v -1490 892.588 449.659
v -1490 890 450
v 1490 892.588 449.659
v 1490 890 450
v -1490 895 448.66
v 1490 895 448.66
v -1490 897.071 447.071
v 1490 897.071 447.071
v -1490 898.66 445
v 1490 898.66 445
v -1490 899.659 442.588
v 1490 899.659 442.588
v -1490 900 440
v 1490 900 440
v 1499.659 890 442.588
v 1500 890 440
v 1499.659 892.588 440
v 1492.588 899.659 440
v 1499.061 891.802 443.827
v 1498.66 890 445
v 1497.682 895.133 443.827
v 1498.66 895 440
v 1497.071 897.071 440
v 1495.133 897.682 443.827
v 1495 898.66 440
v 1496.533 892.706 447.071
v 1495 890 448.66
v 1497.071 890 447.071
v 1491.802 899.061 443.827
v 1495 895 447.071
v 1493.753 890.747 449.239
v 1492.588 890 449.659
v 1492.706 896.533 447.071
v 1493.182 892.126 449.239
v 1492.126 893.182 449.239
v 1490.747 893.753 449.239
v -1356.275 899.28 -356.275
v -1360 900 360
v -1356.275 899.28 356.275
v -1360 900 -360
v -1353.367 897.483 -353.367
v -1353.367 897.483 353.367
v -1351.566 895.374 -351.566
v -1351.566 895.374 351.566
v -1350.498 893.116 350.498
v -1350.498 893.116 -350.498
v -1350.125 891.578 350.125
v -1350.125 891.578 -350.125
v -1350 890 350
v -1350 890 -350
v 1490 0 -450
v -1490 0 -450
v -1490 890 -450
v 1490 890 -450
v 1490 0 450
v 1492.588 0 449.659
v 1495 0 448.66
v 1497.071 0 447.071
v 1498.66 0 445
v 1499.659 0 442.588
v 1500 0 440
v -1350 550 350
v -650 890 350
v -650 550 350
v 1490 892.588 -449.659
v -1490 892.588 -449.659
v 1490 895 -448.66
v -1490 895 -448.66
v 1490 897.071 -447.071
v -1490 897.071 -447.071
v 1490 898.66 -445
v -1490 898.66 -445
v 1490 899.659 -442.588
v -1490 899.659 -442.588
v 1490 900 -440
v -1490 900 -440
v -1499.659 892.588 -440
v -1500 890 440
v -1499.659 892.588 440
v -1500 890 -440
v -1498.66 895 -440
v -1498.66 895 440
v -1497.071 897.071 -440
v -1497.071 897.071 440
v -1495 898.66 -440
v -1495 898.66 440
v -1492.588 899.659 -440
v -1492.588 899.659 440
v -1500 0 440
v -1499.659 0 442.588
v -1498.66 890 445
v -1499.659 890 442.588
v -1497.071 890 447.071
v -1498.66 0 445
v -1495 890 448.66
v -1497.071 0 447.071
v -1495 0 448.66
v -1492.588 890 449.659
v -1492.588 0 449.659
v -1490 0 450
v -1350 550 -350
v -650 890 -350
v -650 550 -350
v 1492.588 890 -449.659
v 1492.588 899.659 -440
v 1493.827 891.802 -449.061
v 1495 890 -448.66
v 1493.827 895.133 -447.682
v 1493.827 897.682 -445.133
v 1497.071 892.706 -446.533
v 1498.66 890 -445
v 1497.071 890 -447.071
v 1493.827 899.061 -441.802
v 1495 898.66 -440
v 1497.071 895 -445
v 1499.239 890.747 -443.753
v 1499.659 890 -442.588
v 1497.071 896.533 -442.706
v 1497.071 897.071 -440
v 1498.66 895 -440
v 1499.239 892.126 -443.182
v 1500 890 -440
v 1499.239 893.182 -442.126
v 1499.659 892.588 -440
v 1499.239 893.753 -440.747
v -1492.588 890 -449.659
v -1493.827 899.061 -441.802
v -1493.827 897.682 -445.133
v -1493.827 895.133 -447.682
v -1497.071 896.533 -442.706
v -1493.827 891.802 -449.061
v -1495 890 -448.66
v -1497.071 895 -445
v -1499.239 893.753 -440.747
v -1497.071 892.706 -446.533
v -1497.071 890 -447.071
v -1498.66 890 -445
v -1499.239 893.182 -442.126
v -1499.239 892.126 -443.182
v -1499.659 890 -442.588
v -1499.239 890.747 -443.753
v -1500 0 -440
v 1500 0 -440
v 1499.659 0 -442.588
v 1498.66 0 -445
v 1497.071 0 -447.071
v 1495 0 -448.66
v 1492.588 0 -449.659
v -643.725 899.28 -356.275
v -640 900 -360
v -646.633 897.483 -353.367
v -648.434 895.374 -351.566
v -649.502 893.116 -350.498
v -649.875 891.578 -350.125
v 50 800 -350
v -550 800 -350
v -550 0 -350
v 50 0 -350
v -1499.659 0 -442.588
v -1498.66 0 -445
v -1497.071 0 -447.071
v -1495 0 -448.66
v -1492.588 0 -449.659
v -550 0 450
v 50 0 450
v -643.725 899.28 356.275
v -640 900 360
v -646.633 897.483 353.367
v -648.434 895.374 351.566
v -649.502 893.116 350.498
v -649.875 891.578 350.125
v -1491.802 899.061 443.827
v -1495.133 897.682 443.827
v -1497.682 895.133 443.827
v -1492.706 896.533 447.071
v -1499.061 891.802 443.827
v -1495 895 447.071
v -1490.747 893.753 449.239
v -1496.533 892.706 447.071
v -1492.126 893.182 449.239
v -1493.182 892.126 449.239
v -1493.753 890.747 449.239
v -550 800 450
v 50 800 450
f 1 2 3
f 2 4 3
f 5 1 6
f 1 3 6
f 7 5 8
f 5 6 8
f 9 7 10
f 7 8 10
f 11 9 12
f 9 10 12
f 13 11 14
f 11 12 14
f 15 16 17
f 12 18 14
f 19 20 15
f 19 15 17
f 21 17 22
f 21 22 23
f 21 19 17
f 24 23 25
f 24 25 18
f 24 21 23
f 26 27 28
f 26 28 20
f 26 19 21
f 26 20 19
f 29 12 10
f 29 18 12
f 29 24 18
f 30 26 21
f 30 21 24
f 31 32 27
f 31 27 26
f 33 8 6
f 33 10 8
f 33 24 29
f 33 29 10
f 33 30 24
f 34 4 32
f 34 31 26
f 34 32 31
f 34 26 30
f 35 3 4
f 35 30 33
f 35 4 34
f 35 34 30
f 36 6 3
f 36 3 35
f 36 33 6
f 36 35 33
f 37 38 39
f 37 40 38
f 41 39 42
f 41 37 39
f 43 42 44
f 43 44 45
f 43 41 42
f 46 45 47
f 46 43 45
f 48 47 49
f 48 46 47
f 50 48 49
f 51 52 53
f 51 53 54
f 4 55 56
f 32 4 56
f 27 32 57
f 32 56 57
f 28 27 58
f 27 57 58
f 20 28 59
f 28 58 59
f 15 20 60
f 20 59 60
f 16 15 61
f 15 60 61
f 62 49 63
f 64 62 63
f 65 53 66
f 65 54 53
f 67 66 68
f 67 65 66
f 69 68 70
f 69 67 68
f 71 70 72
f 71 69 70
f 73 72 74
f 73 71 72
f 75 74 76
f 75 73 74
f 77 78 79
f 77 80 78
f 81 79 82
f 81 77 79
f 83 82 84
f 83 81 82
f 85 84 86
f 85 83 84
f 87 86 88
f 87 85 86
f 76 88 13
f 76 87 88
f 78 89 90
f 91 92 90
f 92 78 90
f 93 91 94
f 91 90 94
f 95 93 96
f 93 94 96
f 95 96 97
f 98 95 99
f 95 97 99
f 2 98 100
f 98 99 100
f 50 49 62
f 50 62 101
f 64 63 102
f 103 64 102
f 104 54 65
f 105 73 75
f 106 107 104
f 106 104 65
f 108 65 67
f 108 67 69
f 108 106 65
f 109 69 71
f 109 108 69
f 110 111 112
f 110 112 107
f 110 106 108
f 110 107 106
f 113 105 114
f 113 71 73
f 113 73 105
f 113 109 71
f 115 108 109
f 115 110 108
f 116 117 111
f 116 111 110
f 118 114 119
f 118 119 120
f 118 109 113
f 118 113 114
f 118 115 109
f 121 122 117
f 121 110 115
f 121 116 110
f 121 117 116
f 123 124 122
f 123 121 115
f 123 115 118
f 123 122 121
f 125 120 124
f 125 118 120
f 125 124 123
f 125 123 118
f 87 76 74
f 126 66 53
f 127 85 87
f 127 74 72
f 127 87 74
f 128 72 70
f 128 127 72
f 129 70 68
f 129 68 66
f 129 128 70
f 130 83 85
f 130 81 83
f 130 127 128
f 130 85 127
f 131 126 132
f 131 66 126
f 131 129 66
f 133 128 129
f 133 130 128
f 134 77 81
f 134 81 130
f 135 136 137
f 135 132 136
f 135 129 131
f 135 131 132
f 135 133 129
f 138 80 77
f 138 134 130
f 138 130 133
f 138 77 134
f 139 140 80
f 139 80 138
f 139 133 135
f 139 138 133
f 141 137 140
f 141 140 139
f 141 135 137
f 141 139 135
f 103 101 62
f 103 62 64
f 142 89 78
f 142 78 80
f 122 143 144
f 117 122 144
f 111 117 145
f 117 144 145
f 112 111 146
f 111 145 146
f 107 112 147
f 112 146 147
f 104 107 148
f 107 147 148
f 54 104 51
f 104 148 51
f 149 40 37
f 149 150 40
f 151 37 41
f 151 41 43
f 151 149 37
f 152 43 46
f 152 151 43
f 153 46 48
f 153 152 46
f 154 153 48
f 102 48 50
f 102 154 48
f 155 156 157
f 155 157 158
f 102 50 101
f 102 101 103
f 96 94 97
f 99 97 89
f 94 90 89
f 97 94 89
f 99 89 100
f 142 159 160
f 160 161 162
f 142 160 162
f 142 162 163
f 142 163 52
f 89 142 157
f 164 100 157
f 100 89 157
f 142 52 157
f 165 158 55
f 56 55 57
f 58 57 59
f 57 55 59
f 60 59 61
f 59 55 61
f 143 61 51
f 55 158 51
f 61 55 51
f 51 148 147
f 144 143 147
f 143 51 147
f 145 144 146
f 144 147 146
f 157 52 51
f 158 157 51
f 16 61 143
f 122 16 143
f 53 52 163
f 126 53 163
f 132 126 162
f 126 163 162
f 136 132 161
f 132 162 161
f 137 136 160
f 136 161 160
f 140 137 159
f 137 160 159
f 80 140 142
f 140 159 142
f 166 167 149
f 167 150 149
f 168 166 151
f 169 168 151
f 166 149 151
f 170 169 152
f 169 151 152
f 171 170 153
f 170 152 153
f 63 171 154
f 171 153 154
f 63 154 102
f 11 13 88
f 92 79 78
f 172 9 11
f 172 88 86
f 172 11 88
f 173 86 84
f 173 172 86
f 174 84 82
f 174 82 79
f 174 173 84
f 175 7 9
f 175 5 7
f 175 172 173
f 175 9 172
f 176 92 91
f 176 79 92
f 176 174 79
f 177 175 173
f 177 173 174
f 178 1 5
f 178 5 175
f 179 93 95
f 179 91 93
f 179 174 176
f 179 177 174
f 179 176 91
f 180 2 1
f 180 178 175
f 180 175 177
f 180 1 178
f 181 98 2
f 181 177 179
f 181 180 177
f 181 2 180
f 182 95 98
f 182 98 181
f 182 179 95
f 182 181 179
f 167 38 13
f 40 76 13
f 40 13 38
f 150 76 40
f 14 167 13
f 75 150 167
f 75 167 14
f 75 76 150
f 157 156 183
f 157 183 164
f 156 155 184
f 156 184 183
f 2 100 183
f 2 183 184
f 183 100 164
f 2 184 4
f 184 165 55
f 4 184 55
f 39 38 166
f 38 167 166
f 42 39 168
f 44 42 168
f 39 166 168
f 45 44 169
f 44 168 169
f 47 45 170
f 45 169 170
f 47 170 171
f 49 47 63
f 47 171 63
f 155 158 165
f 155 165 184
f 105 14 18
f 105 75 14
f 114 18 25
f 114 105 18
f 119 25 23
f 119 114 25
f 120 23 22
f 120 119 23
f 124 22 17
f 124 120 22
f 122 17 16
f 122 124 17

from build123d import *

# Parameters (mm, degrees)
SKETCH1_W               = 3000
SKETCH1_H               = 900
BOSS_EXTRUDE1_DEPTH     = 900
CUT_EXTRUDE2_DEPTH      = 1968.231557291
CUT_EXTRUDE2_DEPTH_BACK = 800
SKETCH2_W               = 700
SKETCH2_H               = 700
CUT_EXTRUDE3_DEPTH      = 350
FILLET1_R               = 10
FILLET2_R               = 10


with BuildPart() as part:
    # Sketch1 → Boss-Extrude1 (new body)
    with BuildSketch(Plane(origin=(0, 0, 0), x_dir=(1, 0, 0), z_dir=(0, 1, 0))):
        Rectangle(SKETCH1_W, SKETCH1_H)
    extrude(amount=BOSS_EXTRUDE1_DEPTH)

    # Sketch3 → Cut-Extrude2 (cut, two sides: drawn at the far end of the back side and taken through both)
    with BuildSketch(Plane.XY.offset(450).offset(-CUT_EXTRUDE2_DEPTH_BACK)):
        Polygon((50, -4487.722635448), (50, 0), (50, 800), (-550, 800), (-550, 0), (-550, -4487.722635448), (-550, -13463.167906343), (50, -13463.167906343), align=None)
    extrude(amount=CUT_EXTRUDE2_DEPTH + CUT_EXTRUDE2_DEPTH_BACK, mode=Mode.SUBTRACT)

    # Sketch2 → Cut-Extrude3 (cut)
    with BuildSketch(Plane(origin=(0, 900, 0), x_dir=(1, 0, 0), z_dir=(0, 1, 0))):
        with Locations((-1000, 0)):
            Rectangle(SKETCH2_W, SKETCH2_H)
    extrude(amount=-CUT_EXTRUDE3_DEPTH, mode=Mode.SUBTRACT)

    # Fillet1
    fillet1_edges = [part.edges().sort_by_distance(p)[0] for p in [
        (-1500, 900, 0),
        (0, 900, 450),
        (-1350, 900, 0),
        (-1000, 900, 350),
        (-650, 900, 0),
        (-1000, 900, -350),
        (1500, 900, 0),
        (0, 900, -450),
    ]]
    fillet(fillet1_edges, radius=FILLET1_R)

    # Fillet2
    # the kernel refuses this fillet: 10 mm, written as the material it takes off along each edge
    with BuildSketch(Plane(origin=(-1490, 890, -440), x_dir=(0, 0, -1), z_dir=(-1, 0, 0))) as fillet2_piece_1_section:
        Polygon((0, 0), (FILLET2_R, 0), (FILLET2_R, -FILLET2_R), (0, -FILLET2_R), align=None)
    fillet2_piece_1 = extrude(amount=FILLET2_R, mode=Mode.PRIVATE)
    fillet2_piece_1 = fillet2_piece_1 - Plane(origin=(-1490, 890, -440), x_dir=(0, -0.7071067811865475, 0.7071067811865475), z_dir=(-1, 0, 0)) * Sphere(FILLET2_R, mode=Mode.PRIVATE)
    add(fillet2_piece_1, mode=Mode.SUBTRACT)
    with BuildSketch(Plane(origin=(1490, 890, -440), x_dir=(0, 0, -1), z_dir=(1, 0, 0))) as fillet2_piece_2_section:
        Polygon((0, 0), (FILLET2_R, 0), (FILLET2_R, FILLET2_R), (0, FILLET2_R), align=None)
    fillet2_piece_2 = extrude(amount=FILLET2_R, mode=Mode.PRIVATE)
    fillet2_piece_2 = fillet2_piece_2 - Plane(origin=(1490, 890, -440), x_dir=(0, -0.7071067811865475, 0.7071067811865475), z_dir=(1, 0, 0)) * Sphere(FILLET2_R, mode=Mode.PRIVATE)
    add(fillet2_piece_2, mode=Mode.SUBTRACT)
    with BuildSketch(Plane(origin=(-1490, 890, 440), x_dir=(-1, 0, 0), z_dir=(0, 0, 1))) as fillet2_piece_3_section:
        Polygon((0, 0), (FILLET2_R, 0), (FILLET2_R, -FILLET2_R), (0, -FILLET2_R), align=None)
    fillet2_piece_3 = extrude(amount=FILLET2_R, mode=Mode.PRIVATE)
    fillet2_piece_3 = fillet2_piece_3 - Plane(origin=(-1490, 890, 440), x_dir=(0.7071067811865475, -0.7071067811865475, 0), z_dir=(0, 0, 1)) * Sphere(FILLET2_R, mode=Mode.PRIVATE)
    add(fillet2_piece_3, mode=Mode.SUBTRACT)
    with BuildSketch(Plane(origin=(1490, 890, 440), x_dir=(1, 0, 0), z_dir=(0, 0, 1))) as fillet2_piece_4_section:
        Polygon((0, 0), (FILLET2_R, 0), (FILLET2_R, FILLET2_R), (0, FILLET2_R), align=None)
    fillet2_piece_4 = extrude(amount=FILLET2_R, mode=Mode.PRIVATE)
    fillet2_piece_4 = fillet2_piece_4 - Plane(origin=(1490, 890, 440), x_dir=(-0.7071067811865475, -0.7071067811865475, 0), z_dir=(0, 0, 1)) * Sphere(FILLET2_R, mode=Mode.PRIVATE)
    add(fillet2_piece_4, mode=Mode.SUBTRACT)
    with BuildSketch(Plane(origin=(1500, -25, 450), x_dir=(-1, 0, 0), z_dir=(0, 1, 0)), Plane(origin=(1500, -25, -450), x_dir=(0, 0, 1), z_dir=(0, 1, 0))) as fillet2_piece_5:
        with BuildLine():
            CenterArc((FILLET2_R, -FILLET2_R), FILLET2_R, 90, 90)
            Line((0, -FILLET2_R), (0, 0))
            Line((0, 0), (FILLET2_R, 0))
        make_face()
    extrude(amount=915, mode=Mode.SUBTRACT)
    with BuildSketch(Plane(origin=(-1500, -25, 450), x_dir=(1, 0, 0), z_dir=(0, 1, 0)), Plane(origin=(-1500, -25, -450), x_dir=(0, 0, 1), z_dir=(0, 1, 0))) as fillet2_piece_6:
        with BuildLine():
            CenterArc((FILLET2_R, FILLET2_R), FILLET2_R, 180, 90)
            Line((0, FILLET2_R), (0, 0))
            Line((0, 0), (FILLET2_R, 0))
        make_face()
    extrude(amount=915, mode=Mode.SUBTRACT)


solid = part.part
